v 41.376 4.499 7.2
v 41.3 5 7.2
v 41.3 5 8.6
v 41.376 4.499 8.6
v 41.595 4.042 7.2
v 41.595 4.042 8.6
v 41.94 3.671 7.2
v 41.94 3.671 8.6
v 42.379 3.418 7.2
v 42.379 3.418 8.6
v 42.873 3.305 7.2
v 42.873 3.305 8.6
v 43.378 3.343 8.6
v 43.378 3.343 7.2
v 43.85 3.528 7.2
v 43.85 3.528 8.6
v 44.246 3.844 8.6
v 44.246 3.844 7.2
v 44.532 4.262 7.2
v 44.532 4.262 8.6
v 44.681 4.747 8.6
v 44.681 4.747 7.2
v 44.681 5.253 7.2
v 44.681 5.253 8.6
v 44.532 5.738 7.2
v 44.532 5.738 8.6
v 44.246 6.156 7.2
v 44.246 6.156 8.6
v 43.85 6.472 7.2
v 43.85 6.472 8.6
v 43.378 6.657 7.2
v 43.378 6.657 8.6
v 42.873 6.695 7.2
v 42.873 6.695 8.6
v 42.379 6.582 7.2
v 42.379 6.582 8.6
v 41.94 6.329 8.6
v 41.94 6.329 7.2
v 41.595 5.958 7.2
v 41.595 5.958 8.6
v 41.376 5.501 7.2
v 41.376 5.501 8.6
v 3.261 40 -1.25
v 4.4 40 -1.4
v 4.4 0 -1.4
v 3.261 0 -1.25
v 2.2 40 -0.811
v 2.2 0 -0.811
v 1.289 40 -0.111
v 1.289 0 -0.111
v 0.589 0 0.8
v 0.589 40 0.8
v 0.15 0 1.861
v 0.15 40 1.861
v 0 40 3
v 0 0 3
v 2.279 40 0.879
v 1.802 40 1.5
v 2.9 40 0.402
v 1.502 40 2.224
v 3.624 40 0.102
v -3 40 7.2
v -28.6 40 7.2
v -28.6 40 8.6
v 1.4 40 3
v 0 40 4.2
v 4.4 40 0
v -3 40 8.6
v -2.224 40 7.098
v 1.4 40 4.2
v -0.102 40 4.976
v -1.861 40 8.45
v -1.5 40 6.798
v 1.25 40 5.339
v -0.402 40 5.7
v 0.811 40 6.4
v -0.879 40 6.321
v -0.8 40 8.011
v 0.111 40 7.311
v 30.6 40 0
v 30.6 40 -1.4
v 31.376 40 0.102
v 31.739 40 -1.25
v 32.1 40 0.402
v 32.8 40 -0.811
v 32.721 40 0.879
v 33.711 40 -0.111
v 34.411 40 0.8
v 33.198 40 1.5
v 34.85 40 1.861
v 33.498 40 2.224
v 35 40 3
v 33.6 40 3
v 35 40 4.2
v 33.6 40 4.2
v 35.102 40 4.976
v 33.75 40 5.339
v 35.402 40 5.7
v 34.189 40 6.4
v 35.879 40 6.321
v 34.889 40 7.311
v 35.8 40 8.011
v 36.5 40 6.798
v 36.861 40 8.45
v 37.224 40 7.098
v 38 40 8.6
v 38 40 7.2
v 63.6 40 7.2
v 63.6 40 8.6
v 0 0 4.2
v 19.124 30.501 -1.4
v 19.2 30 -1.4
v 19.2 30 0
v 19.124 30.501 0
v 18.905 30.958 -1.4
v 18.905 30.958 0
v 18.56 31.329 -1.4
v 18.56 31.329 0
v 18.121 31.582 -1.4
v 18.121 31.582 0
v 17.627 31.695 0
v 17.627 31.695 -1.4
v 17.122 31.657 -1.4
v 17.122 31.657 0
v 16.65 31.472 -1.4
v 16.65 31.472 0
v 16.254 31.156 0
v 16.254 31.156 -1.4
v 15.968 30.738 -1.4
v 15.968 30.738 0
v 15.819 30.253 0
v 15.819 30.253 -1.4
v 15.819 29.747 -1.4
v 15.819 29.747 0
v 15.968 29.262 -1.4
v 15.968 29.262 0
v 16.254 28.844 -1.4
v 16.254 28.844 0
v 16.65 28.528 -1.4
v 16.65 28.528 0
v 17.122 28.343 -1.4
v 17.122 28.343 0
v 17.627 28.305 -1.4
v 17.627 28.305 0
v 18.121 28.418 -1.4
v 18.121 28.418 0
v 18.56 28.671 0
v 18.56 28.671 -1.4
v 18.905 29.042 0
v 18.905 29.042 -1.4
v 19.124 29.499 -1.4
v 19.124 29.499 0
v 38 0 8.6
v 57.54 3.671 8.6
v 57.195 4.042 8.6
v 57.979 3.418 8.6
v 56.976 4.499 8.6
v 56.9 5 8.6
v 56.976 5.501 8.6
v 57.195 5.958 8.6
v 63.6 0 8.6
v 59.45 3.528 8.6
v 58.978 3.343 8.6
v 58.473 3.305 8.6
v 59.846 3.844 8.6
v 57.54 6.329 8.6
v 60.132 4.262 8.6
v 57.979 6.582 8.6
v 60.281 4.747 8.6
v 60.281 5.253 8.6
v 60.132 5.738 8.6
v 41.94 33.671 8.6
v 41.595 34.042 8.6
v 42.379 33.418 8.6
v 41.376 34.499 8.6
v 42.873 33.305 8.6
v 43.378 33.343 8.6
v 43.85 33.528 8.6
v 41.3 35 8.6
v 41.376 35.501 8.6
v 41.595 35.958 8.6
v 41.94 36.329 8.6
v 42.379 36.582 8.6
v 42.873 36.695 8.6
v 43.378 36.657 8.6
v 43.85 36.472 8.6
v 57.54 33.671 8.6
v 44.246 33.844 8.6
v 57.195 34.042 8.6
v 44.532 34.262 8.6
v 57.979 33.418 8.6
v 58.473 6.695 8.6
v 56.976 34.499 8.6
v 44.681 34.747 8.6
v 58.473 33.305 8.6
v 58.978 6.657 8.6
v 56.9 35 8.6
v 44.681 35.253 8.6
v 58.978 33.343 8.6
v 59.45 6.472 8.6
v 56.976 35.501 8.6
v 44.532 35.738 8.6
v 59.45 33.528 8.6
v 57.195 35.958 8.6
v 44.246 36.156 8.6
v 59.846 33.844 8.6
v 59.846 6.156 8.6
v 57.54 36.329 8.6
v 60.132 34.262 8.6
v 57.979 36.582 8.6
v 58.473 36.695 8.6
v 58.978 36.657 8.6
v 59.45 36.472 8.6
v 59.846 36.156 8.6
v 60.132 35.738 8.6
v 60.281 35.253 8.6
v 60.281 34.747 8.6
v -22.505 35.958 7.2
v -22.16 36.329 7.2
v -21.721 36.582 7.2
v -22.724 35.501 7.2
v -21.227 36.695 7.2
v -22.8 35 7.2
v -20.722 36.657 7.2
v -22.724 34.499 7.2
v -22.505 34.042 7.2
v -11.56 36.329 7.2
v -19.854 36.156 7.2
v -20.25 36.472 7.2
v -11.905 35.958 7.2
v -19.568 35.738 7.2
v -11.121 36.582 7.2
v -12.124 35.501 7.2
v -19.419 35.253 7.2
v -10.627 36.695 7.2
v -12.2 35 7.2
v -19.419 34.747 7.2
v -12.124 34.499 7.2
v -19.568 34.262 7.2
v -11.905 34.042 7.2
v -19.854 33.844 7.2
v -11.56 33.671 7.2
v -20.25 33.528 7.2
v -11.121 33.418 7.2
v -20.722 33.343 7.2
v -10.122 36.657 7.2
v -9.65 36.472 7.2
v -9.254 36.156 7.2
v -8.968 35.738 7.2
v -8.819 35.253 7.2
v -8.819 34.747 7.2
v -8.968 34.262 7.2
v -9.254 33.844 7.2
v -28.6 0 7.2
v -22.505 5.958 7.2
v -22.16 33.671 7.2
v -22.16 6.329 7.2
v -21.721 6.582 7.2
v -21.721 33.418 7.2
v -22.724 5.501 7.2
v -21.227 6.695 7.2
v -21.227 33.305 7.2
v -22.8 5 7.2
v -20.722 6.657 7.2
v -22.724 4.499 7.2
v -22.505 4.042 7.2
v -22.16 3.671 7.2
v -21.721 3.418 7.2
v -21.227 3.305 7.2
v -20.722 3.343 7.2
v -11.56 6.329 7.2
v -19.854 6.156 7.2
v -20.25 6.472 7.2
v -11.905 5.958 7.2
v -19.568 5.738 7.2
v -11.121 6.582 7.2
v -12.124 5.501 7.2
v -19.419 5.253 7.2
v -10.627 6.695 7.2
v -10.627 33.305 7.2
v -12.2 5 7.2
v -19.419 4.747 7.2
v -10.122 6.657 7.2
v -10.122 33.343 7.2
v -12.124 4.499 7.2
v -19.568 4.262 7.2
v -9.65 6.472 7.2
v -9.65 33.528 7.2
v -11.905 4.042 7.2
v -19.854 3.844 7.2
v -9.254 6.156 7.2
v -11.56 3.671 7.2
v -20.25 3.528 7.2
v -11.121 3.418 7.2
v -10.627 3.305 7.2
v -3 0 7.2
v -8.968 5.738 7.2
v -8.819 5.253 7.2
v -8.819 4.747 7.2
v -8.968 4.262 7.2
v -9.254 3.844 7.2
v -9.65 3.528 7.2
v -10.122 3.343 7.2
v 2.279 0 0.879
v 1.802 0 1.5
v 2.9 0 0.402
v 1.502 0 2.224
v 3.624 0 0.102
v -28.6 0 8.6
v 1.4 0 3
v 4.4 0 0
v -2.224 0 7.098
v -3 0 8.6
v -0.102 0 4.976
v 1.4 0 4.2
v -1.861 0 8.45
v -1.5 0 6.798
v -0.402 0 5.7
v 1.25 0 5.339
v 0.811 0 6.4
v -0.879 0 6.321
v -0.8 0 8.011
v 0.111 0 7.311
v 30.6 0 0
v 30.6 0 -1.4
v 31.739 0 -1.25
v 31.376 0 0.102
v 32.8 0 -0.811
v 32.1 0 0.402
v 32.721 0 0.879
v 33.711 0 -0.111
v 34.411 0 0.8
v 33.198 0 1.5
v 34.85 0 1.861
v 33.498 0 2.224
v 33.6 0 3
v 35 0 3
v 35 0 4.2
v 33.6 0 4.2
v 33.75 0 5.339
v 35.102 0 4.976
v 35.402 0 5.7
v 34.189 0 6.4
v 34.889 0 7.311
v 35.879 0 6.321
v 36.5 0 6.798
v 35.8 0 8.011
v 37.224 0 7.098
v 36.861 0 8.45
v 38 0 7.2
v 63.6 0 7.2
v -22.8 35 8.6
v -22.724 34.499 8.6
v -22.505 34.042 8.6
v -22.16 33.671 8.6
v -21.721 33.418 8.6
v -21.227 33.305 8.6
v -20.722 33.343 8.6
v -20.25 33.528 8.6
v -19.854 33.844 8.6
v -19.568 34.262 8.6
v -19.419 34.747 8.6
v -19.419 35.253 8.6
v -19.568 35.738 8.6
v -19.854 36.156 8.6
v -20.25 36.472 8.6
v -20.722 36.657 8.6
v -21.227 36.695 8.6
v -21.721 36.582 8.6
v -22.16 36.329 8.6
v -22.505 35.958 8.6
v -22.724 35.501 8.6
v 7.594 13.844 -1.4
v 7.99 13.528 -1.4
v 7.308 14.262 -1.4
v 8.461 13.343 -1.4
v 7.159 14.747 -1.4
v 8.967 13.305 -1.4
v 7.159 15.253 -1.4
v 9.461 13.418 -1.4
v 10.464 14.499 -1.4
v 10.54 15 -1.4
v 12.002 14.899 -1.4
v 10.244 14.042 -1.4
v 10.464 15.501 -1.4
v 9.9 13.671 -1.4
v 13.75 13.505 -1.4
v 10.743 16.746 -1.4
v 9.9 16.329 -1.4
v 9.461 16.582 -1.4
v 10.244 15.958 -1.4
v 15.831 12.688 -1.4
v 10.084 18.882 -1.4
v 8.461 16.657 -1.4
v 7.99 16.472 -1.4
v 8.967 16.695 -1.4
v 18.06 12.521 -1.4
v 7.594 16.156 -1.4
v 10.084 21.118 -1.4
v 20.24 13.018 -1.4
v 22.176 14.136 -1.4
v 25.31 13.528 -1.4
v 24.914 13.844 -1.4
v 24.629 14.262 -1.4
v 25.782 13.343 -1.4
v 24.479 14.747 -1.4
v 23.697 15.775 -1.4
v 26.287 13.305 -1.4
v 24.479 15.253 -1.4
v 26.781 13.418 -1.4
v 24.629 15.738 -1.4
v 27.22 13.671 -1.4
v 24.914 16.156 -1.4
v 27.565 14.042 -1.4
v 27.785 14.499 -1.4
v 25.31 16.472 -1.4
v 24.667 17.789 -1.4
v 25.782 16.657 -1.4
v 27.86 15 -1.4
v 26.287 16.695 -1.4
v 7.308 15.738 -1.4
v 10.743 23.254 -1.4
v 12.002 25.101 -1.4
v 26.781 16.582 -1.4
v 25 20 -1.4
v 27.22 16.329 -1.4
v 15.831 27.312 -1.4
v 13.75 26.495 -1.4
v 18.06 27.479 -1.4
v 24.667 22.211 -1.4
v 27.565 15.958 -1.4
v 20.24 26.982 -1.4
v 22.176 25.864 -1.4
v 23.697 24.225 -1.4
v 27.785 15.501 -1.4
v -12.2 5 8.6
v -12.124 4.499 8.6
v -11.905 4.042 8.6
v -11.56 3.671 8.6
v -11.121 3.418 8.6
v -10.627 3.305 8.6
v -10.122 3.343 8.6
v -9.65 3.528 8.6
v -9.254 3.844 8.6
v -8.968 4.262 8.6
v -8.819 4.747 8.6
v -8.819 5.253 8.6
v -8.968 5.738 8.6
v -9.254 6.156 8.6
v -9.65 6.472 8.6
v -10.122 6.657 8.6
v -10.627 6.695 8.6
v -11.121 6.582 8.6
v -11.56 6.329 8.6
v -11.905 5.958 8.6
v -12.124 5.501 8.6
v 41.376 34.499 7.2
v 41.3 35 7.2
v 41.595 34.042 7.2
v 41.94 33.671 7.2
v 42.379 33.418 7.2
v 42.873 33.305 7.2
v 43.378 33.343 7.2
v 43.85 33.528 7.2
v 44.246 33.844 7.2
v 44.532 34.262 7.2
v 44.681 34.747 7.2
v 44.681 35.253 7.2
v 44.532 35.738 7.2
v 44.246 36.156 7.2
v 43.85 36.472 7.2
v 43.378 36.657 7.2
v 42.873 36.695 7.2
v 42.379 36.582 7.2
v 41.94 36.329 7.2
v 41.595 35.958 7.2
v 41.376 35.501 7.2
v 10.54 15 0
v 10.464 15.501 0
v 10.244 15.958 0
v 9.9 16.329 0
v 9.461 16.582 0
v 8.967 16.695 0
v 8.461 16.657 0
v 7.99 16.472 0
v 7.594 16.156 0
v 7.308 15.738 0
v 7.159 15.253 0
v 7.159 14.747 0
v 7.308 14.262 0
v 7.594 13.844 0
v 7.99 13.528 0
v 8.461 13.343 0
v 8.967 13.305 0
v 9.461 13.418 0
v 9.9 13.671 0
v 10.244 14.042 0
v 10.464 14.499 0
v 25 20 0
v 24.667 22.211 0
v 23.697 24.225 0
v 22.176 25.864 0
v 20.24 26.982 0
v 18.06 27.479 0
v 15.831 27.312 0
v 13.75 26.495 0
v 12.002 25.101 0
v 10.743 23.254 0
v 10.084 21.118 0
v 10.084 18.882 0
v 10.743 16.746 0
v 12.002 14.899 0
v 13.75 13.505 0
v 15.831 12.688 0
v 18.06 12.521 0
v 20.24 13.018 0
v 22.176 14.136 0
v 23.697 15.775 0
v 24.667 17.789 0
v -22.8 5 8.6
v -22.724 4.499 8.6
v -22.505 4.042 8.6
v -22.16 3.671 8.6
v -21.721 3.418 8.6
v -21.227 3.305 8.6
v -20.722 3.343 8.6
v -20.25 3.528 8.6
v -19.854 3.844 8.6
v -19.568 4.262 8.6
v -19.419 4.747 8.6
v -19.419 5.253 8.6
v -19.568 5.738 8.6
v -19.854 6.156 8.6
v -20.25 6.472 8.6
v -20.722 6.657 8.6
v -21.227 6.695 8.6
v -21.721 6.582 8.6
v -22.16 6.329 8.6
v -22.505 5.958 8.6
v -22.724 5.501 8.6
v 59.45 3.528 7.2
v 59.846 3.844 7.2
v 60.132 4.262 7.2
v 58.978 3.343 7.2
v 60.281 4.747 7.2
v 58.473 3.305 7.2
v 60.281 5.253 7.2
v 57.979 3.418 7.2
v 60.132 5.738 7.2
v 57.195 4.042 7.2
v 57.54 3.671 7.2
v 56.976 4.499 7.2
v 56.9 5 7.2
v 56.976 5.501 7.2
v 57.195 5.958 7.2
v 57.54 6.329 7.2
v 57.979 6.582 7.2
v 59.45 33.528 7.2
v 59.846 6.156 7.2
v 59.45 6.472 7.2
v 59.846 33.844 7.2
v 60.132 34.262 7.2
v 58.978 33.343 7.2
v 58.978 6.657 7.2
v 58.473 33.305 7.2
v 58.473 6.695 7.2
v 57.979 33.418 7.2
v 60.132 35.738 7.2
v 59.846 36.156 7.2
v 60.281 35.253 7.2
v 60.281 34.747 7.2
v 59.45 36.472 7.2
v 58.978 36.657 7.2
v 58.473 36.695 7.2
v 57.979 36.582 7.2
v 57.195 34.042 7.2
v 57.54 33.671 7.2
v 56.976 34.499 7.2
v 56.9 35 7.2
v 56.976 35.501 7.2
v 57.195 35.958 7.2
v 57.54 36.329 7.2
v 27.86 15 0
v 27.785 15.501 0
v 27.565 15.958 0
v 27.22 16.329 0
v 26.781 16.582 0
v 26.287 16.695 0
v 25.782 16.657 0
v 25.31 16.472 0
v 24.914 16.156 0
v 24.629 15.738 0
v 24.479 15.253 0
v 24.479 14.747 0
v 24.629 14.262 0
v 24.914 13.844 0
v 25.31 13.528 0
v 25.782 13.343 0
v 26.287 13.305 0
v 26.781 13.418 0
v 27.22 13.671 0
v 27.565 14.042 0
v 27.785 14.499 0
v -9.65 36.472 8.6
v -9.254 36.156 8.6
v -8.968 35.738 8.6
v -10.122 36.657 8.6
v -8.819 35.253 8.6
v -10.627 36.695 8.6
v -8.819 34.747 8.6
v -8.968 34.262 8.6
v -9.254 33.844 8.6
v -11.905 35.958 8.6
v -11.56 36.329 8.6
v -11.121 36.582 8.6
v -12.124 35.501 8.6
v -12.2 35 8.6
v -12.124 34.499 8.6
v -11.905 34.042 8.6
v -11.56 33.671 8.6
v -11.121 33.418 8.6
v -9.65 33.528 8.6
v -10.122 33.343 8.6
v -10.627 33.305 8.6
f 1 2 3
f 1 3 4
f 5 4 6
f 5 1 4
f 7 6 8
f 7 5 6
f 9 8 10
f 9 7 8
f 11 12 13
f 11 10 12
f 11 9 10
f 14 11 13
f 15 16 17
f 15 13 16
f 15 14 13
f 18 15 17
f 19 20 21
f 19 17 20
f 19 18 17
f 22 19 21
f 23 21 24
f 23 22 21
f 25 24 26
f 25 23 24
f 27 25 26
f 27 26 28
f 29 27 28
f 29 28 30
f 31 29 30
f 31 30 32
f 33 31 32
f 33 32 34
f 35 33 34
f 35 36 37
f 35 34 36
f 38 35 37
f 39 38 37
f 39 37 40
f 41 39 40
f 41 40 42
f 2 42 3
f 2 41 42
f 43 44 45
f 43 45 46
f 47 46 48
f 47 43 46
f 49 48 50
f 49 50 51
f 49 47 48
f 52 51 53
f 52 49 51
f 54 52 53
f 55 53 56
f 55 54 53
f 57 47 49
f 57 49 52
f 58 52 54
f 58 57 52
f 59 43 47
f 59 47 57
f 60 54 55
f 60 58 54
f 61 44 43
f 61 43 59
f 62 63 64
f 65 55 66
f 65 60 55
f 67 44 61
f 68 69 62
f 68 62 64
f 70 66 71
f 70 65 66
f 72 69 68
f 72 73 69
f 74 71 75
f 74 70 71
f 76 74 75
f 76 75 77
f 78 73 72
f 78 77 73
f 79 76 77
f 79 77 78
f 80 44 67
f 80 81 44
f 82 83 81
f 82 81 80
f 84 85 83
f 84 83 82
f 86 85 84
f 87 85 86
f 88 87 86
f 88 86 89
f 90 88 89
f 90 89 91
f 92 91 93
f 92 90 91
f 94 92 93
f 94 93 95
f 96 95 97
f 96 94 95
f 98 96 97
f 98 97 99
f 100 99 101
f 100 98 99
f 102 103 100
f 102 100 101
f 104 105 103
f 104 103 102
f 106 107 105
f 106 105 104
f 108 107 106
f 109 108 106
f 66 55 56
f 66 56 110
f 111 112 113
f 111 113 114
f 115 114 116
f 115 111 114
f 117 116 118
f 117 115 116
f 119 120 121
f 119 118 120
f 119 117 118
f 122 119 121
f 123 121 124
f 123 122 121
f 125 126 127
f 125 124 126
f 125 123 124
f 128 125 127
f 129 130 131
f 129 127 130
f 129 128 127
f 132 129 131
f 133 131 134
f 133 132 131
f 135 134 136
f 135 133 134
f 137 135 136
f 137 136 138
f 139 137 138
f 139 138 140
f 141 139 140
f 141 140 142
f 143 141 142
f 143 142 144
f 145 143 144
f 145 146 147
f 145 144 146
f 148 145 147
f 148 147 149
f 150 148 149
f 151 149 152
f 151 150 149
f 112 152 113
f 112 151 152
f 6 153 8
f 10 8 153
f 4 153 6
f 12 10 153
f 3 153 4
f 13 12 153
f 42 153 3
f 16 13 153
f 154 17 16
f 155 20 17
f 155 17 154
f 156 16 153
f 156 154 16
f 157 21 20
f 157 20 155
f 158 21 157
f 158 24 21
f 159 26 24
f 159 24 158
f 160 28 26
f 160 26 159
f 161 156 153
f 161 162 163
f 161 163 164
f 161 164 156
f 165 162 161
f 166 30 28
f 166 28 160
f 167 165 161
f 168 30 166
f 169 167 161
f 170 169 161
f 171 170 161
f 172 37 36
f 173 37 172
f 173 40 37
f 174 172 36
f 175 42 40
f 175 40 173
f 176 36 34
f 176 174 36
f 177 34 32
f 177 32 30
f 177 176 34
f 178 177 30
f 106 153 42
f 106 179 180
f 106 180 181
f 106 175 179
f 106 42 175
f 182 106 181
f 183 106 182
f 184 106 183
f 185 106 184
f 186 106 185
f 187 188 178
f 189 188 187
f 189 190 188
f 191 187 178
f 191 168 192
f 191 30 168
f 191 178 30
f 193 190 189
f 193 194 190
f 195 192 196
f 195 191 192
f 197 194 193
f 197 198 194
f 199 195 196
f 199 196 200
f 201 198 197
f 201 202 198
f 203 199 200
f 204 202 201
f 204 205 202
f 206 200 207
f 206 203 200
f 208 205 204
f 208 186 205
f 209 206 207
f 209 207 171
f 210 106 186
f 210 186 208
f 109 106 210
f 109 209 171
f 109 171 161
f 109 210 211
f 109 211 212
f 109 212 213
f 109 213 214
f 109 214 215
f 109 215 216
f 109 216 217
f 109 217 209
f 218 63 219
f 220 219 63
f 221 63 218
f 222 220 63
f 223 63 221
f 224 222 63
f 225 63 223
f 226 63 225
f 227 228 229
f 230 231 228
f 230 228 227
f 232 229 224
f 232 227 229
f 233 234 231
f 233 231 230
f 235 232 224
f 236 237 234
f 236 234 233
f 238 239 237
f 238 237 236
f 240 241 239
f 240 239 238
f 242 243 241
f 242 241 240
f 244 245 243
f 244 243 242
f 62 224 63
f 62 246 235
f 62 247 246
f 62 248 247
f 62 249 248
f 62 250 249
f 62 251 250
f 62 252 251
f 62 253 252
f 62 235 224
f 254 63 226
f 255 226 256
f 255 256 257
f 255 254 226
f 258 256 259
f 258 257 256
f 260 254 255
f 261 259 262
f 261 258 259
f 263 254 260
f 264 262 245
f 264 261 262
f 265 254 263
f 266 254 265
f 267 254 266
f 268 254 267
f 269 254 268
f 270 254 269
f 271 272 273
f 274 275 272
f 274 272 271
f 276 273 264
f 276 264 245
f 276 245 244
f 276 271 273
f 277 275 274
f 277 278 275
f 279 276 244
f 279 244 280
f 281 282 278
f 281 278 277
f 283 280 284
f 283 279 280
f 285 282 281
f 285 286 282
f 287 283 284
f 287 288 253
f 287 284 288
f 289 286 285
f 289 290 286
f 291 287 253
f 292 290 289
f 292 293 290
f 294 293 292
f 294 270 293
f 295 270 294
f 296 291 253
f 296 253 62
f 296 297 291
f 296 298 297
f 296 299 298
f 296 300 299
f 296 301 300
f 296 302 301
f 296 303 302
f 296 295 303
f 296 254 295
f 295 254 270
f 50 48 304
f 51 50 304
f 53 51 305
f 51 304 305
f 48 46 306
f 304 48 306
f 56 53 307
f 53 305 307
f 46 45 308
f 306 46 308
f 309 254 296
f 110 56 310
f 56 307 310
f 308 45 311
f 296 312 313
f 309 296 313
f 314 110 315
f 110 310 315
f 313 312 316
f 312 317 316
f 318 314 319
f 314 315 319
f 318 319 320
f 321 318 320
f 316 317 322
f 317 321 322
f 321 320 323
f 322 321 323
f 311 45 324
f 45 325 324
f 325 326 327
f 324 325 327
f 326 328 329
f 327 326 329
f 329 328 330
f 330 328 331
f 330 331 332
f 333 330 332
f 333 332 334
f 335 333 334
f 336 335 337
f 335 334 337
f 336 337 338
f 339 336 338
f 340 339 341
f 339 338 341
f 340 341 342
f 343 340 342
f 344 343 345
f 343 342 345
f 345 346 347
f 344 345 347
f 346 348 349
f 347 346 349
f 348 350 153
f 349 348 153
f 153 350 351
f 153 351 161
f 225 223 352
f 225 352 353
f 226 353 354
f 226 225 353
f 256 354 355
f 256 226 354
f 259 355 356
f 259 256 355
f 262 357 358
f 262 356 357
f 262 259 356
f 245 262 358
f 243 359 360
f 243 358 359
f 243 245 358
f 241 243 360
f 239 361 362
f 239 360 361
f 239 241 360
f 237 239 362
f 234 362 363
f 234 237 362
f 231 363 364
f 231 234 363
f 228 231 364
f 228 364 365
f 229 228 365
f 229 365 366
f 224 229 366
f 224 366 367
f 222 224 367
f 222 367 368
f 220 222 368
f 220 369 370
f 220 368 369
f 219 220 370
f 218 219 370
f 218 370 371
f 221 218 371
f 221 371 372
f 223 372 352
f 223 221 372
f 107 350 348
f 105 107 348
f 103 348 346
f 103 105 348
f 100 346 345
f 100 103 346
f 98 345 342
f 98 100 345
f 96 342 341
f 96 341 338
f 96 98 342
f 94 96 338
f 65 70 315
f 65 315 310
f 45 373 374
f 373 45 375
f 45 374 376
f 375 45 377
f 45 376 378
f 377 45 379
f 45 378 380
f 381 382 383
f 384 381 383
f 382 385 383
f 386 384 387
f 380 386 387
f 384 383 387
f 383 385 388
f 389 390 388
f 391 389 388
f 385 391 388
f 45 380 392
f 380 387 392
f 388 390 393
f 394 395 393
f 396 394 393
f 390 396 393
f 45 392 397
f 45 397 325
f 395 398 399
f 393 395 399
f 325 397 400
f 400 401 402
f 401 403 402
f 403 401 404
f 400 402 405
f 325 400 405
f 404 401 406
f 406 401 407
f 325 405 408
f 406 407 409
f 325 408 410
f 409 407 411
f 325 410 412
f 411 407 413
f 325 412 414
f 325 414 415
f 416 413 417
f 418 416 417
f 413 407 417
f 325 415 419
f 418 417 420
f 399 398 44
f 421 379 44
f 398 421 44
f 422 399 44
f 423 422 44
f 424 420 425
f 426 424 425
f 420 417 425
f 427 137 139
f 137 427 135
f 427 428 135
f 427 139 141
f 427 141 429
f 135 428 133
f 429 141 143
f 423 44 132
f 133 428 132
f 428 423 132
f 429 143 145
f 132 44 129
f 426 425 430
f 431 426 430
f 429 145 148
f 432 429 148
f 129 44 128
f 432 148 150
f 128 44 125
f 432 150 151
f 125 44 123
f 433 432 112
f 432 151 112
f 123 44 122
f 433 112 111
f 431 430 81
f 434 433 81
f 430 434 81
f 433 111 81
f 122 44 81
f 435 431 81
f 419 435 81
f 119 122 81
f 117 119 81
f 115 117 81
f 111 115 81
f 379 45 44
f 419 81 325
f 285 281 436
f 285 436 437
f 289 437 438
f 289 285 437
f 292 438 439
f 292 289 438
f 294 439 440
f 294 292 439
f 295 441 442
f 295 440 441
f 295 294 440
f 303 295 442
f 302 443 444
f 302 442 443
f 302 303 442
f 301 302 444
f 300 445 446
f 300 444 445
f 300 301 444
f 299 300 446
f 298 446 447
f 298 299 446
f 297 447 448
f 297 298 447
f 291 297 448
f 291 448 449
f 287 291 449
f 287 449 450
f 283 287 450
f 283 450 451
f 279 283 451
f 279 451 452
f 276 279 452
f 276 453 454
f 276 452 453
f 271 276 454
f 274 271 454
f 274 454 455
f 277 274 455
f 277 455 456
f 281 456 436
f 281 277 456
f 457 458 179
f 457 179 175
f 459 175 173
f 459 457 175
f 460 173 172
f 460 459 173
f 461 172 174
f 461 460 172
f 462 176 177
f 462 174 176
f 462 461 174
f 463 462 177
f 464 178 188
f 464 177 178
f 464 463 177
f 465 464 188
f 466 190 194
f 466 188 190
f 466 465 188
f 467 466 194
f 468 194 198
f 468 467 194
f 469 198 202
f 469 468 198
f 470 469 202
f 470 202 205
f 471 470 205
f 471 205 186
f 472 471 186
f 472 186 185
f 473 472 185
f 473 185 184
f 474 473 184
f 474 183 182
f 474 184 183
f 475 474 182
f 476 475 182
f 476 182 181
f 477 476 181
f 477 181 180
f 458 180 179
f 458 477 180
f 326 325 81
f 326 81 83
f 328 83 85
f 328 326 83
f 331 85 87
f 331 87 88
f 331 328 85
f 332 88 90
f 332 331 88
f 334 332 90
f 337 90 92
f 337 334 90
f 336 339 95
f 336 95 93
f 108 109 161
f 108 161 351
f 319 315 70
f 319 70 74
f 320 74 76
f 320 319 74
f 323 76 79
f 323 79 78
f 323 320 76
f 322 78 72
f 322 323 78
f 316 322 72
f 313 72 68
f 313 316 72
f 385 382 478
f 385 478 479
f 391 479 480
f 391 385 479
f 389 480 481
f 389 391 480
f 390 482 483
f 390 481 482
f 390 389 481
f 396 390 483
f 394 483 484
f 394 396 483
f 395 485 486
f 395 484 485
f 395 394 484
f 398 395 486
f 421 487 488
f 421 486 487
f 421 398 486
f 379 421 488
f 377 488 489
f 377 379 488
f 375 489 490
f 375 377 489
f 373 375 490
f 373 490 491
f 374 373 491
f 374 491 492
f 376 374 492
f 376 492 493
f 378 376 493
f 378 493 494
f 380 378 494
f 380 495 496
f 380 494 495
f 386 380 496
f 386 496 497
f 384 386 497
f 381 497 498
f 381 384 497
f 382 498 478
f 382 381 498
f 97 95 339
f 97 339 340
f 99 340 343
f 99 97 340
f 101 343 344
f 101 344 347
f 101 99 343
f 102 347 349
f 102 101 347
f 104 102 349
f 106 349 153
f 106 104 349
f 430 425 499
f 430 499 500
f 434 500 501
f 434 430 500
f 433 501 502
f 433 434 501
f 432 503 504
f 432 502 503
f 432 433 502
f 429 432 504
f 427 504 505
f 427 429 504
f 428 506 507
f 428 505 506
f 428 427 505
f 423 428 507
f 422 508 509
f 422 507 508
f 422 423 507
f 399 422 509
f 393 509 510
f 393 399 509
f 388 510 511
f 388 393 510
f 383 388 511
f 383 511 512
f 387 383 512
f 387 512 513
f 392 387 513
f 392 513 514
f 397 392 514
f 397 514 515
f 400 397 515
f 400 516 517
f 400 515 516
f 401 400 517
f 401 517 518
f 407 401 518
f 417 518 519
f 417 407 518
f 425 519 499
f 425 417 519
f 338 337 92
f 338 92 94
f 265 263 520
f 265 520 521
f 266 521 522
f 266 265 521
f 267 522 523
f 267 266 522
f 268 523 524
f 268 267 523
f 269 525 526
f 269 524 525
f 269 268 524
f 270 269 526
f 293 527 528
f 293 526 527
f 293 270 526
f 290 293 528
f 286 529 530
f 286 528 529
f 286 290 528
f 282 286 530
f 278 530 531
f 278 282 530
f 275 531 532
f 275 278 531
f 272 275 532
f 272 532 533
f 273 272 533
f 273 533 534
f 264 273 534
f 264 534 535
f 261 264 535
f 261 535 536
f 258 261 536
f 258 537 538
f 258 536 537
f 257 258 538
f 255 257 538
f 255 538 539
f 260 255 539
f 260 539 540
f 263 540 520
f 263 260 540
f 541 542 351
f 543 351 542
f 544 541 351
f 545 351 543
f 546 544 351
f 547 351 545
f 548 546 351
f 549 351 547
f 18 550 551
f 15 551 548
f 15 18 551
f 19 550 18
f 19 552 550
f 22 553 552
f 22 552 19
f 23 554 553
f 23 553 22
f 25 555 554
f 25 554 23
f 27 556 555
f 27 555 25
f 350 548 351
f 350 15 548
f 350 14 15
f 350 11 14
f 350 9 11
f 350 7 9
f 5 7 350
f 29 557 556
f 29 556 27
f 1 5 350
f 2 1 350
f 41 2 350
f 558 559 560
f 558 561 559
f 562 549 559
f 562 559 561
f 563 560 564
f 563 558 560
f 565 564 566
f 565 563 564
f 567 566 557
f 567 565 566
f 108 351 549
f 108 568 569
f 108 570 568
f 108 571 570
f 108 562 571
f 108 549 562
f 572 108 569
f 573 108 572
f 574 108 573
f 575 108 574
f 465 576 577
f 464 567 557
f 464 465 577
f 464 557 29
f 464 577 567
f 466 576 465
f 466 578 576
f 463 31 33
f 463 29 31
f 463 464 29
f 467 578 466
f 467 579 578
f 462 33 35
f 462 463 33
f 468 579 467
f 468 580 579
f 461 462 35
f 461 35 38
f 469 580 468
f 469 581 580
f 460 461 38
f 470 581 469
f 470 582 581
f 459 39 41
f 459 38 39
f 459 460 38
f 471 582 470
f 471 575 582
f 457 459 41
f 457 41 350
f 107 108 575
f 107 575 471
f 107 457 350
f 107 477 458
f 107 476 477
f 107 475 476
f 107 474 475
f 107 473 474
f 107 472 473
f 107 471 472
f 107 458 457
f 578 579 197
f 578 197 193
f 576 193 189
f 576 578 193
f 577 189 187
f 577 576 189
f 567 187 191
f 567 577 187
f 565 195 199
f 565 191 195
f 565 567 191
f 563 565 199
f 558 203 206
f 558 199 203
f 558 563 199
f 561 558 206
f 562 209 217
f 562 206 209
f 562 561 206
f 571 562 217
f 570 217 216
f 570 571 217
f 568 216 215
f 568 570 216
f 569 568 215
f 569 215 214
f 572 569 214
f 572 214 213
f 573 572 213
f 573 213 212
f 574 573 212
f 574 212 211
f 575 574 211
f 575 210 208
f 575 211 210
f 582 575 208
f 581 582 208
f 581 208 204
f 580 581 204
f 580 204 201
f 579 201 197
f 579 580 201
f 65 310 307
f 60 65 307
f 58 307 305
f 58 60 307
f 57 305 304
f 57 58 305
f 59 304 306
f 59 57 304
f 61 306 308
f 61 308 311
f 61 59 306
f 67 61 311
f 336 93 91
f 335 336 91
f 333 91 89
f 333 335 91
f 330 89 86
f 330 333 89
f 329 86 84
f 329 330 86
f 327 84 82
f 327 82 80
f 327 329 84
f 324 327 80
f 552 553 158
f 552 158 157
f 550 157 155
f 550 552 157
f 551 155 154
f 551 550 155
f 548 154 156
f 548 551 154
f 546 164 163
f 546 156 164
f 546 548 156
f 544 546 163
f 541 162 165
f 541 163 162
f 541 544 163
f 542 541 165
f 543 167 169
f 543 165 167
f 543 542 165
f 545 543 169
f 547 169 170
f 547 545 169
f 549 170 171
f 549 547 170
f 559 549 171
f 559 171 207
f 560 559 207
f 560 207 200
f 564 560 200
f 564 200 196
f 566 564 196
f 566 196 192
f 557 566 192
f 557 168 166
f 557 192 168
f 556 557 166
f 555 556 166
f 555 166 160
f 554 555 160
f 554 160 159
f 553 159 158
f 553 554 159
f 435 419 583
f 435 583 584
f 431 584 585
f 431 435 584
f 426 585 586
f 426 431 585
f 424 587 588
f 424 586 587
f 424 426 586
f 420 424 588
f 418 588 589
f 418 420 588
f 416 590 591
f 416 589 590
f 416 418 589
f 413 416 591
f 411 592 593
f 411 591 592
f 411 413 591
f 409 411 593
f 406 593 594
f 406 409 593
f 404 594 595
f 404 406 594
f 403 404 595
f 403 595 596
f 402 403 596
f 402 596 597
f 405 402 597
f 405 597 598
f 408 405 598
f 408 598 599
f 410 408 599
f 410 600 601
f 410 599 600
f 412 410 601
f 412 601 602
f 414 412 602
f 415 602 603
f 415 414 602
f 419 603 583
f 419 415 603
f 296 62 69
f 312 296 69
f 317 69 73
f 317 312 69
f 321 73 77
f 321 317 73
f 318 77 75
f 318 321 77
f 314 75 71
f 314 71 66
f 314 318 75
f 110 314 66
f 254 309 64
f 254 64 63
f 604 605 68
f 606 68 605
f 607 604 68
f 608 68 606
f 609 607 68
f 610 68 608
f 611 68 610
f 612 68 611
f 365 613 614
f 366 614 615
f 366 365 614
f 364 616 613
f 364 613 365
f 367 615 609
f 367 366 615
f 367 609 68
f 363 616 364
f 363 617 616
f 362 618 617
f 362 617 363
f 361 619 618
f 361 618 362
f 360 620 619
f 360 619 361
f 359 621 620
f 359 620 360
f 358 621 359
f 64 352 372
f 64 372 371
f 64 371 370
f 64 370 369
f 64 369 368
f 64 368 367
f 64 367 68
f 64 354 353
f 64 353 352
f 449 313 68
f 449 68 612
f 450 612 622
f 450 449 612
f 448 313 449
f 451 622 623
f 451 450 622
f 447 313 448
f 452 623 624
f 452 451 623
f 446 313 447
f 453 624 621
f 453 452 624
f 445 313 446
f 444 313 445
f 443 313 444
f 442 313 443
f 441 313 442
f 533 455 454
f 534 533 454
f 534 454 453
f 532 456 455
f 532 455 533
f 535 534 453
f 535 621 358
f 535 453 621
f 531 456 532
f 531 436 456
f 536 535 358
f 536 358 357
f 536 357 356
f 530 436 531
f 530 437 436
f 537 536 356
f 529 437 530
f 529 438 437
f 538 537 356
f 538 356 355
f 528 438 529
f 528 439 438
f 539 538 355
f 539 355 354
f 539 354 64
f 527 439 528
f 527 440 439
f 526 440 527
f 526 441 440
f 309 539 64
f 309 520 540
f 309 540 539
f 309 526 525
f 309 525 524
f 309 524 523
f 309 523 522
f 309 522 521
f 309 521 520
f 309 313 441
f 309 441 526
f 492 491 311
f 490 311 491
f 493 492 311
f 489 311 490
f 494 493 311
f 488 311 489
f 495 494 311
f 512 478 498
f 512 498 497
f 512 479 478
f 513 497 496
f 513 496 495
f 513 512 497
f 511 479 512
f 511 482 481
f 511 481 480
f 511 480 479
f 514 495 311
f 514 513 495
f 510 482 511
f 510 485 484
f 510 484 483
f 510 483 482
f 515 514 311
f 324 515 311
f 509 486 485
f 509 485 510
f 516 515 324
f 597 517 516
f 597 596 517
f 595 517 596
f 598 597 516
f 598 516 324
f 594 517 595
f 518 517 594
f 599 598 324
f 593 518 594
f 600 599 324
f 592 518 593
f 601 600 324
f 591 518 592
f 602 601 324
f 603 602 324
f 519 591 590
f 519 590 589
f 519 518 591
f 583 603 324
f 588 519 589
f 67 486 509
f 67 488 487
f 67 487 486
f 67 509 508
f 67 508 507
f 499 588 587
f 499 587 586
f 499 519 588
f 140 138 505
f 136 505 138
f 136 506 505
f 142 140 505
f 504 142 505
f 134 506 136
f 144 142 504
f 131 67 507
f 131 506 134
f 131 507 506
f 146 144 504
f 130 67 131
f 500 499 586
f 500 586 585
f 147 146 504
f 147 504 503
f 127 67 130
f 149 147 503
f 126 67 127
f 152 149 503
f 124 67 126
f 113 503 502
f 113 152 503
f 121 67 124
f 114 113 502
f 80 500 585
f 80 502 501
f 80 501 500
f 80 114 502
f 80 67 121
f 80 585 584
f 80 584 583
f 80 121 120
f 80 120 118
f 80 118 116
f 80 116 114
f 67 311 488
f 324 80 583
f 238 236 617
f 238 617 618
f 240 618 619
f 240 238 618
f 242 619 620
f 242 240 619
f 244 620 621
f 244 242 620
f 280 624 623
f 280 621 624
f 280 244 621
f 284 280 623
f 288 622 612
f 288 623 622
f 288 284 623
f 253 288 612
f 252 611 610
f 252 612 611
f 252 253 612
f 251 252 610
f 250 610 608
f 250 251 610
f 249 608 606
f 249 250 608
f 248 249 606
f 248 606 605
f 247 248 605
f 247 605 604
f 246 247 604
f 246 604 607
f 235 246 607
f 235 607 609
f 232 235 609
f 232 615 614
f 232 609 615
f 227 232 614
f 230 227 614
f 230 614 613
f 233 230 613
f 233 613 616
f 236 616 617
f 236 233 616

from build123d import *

# Parameters (mm, degrees)
SKETCH6_W                    = 35
SKETCH6_H                    = 40
BASE_FLANGE2_DEPTH           = 1.4
EDGE_FLANGE1_STRIP_W         = 11.6
EDGE_FLANGE1_STRIP_H         = 1.4
EDGE_FLANGE1_STRIP_CUT_DEPTH = 40
EDGE_FLANGE1_DEPTH           = 40
EDGE_FLANGE2_STRIP_W         = 11.6
EDGE_FLANGE2_STRIP_H         = 1.4
EDGE_FLANGE2_STRIP_CUT_DEPTH = 40
EDGE_FLANGE2_DEPTH           = 40
EDGE_FLANGE3_STRIP_W         = 11.6
EDGE_FLANGE3_STRIP_H         = 1.4
EDGE_FLANGE3_STRIP_CUT_DEPTH = 40
EDGE_FLANGE3_DEPTH           = 40
EDGE_FLANGE4_STRIP_W         = 11.6
EDGE_FLANGE4_STRIP_H         = 1.4
EDGE_FLANGE4_STRIP_CUT_DEPTH = 40
EDGE_FLANGE4_DEPTH           = 40
CUT_EXTRUDE2_DEPTH           = 76.623541308
CUT_EXTRUDE2_DEPTH_BACK      = 76.623541308
SKETCH11_R                   = 7.5
SKETCH11_R_2                 = 1.7
CUT_EXTRUDE3_DEPTH           = 76.795514379
CUT_EXTRUDE3_DEPTH_BACK      = 76.795514379
SKETCH26_R                   = 1.7
CUT_EXTRUDE4_DEPTH           = 76.795514379
CUT_EXTRUDE4_DEPTH_BACK      = 76.795514379
SKETCH27_R                   = 1.7


# Sheet-metal steps are written as plain solids
with BuildPart() as part:
    # Sketch6 → Base-Flange2 (new body)
    with BuildSketch(Plane.XY):
        with Locations((17.5, 20)):
            Rectangle(SKETCH6_W, SKETCH6_H)
    extrude(amount=-BASE_FLANGE2_DEPTH)

    # Edge-Flange1 strip (across the edge) → Edge-Flange1 strip cut (cut)
    with BuildSketch(Plane.XZ.offset(-40)):
        with Locations((-1.4, -0.7)):
            Rectangle(EDGE_FLANGE1_STRIP_W, EDGE_FLANGE1_STRIP_H)
    extrude(amount=EDGE_FLANGE1_STRIP_CUT_DEPTH, mode=Mode.SUBTRACT)

    # Edge-Flange1 section (across the edge) → Edge-Flange1 (add)
    with BuildSketch(Plane.XZ.offset(-40)):
        with BuildLine():
            Line((0, 3), (0, 8.6))
            Line((0, 8.6), (1.4, 8.6))
            Line((1.4, 8.6), (1.4, 3))
            ThreePointArc((1.4, 3), (2.278679656, 0.878679656), (4.4, 0))
            Line((4.4, 0), (4.4, -1.4))
            ThreePointArc((4.4, -1.4), (1.288730163, -0.111269837), (0, 3))
        make_face()
    extrude(amount=EDGE_FLANGE1_DEPTH)

    # Edge-Flange2 strip (across the edge) → Edge-Flange2 strip cut (cut)
    with BuildSketch(Plane(origin=(35, 0, 0), x_dir=(-1, 0, 0), z_dir=(0, 1, 0))):
        with Locations((-1.4, -0.7)):
            Rectangle(EDGE_FLANGE2_STRIP_W, EDGE_FLANGE2_STRIP_H)
    extrude(amount=EDGE_FLANGE2_STRIP_CUT_DEPTH, mode=Mode.SUBTRACT)

    # Edge-Flange2 section (across the edge) → Edge-Flange2 (add)
    with BuildSketch(Plane(origin=(35, 0, 0), x_dir=(-1, 0, 0), z_dir=(0, 1, 0))):
        with BuildLine():
            Line((0, 3), (0, 8.6))
            Line((0, 8.6), (1.4, 8.6))
            Line((1.4, 8.6), (1.4, 3))
            ThreePointArc((1.4, 3), (2.278679656, 0.878679656), (4.4, 0))
            Line((4.4, 0), (4.4, -1.4))
            ThreePointArc((4.4, -1.4), (1.288730163, -0.111269837), (0, 3))
        make_face()
    extrude(amount=EDGE_FLANGE2_DEPTH)

    # Edge-Flange3 strip (across the edge) → Edge-Flange3 strip cut (cut)
    with BuildSketch(Plane(origin=(0, 0, 8.6), x_dir=(0, 0, -1), z_dir=(0, 1, 0))):
        with Locations((-1.4, -0.7)):
            Rectangle(EDGE_FLANGE3_STRIP_W, EDGE_FLANGE3_STRIP_H)
    extrude(amount=EDGE_FLANGE3_STRIP_CUT_DEPTH, mode=Mode.SUBTRACT)

    # Edge-Flange3 section (across the edge) → Edge-Flange3 (add)
    with BuildSketch(Plane(origin=(0, 0, 8.6), x_dir=(0, 0, -1), z_dir=(0, 1, 0))):
        with BuildLine():
            Line((0, 3), (0, 28.6))
            Line((0, 28.6), (1.4, 28.6))
            Line((1.4, 28.6), (1.4, 3))
            ThreePointArc((1.4, 3), (2.278679656, 0.878679656), (4.4, 0))
            Line((4.4, 0), (4.4, -1.4))
            ThreePointArc((4.4, -1.4), (1.288730163, -0.111269837), (0, 3))
        make_face()
    extrude(amount=EDGE_FLANGE3_DEPTH)

    # Edge-Flange4 strip (across the edge) → Edge-Flange4 strip cut (cut)
    with BuildSketch(Plane(origin=(35, 40, 8.6), x_dir=(0, 0, -1), z_dir=(0, -1, 0))):
        with Locations((-1.4, -0.7)):
            Rectangle(EDGE_FLANGE4_STRIP_W, EDGE_FLANGE4_STRIP_H)
    extrude(amount=EDGE_FLANGE4_STRIP_CUT_DEPTH, mode=Mode.SUBTRACT)

    # Edge-Flange4 section (across the edge) → Edge-Flange4 (add)
    with BuildSketch(Plane(origin=(35, 40, 8.6), x_dir=(0, 0, -1), z_dir=(0, -1, 0))):
        with BuildLine():
            Line((0, 3), (0, 28.6))
            Line((0, 28.6), (1.4, 28.6))
            Line((1.4, 28.6), (1.4, 3))
            ThreePointArc((1.4, 3), (2.278679656, 0.878679656), (4.4, 0))
            Line((4.4, 0), (4.4, -1.4))
            ThreePointArc((4.4, -1.4), (1.288730163, -0.111269837), (0, 3))
        make_face()
    extrude(amount=EDGE_FLANGE4_DEPTH)

    # Sketch11 → Cut-Extrude2 (cut, two sides: drawn at the far end of the back side and taken through both)
    with BuildSketch(Plane.XY.offset(-CUT_EXTRUDE2_DEPTH_BACK)):
        with Locations((17.5, 20)):
            Circle(SKETCH11_R)
        with Locations((17.5, 30)):
            Circle(SKETCH11_R_2)
        with Locations((8.839745962, 15)):
            Circle(SKETCH11_R_2)
        with Locations((26.160254038, 15)):
            Circle(SKETCH11_R_2)
    extrude(amount=CUT_EXTRUDE2_DEPTH + CUT_EXTRUDE2_DEPTH_BACK, mode=Mode.SUBTRACT)

    # Sketch26 → Cut-Extrude3 (cut, two sides: drawn at the far end of the back side and taken through both)
    with BuildSketch(Plane.XY.offset(8.6).offset(-CUT_EXTRUDE3_DEPTH_BACK)):
        with Locations(Location((-21.1, 35, 0), (0, 0, 180))):
            Circle(SKETCH26_R)
        with Locations(Location((-10.5, 35, 0), (0, 0, 180))):
            Circle(SKETCH26_R)
        with Locations(Location((-21.1, 5, 0), (0, 0, 180))):
            Circle(SKETCH26_R)
        with Locations(Location((-10.5, 5, 0), (0, 0, 180))):
            Circle(SKETCH26_R)
    extrude(amount=CUT_EXTRUDE3_DEPTH + CUT_EXTRUDE3_DEPTH_BACK, mode=Mode.SUBTRACT)

    # Sketch27 → Cut-Extrude4 (cut, two sides: drawn at the far end of the back side and taken through both)
    with BuildSketch(Plane.XY.offset(8.6).offset(-CUT_EXTRUDE4_DEPTH_BACK)):
        with Locations(Location((43, 35, 0), (0, 0, 180))):
            Circle(SKETCH27_R)
        with Locations(Location((58.6, 35, 0), (0, 0, 180))):
            Circle(SKETCH27_R)
        with Locations(Location((43, 5, 0), (0, 0, 180))):
            Circle(SKETCH27_R)
        with Locations(Location((58.6, 5, 0), (0, 0, 180))):
            Circle(SKETCH27_R)
    extrude(amount=CUT_EXTRUDE4_DEPTH + CUT_EXTRUDE4_DEPTH_BACK, mode=Mode.SUBTRACT)


solid = part.part
